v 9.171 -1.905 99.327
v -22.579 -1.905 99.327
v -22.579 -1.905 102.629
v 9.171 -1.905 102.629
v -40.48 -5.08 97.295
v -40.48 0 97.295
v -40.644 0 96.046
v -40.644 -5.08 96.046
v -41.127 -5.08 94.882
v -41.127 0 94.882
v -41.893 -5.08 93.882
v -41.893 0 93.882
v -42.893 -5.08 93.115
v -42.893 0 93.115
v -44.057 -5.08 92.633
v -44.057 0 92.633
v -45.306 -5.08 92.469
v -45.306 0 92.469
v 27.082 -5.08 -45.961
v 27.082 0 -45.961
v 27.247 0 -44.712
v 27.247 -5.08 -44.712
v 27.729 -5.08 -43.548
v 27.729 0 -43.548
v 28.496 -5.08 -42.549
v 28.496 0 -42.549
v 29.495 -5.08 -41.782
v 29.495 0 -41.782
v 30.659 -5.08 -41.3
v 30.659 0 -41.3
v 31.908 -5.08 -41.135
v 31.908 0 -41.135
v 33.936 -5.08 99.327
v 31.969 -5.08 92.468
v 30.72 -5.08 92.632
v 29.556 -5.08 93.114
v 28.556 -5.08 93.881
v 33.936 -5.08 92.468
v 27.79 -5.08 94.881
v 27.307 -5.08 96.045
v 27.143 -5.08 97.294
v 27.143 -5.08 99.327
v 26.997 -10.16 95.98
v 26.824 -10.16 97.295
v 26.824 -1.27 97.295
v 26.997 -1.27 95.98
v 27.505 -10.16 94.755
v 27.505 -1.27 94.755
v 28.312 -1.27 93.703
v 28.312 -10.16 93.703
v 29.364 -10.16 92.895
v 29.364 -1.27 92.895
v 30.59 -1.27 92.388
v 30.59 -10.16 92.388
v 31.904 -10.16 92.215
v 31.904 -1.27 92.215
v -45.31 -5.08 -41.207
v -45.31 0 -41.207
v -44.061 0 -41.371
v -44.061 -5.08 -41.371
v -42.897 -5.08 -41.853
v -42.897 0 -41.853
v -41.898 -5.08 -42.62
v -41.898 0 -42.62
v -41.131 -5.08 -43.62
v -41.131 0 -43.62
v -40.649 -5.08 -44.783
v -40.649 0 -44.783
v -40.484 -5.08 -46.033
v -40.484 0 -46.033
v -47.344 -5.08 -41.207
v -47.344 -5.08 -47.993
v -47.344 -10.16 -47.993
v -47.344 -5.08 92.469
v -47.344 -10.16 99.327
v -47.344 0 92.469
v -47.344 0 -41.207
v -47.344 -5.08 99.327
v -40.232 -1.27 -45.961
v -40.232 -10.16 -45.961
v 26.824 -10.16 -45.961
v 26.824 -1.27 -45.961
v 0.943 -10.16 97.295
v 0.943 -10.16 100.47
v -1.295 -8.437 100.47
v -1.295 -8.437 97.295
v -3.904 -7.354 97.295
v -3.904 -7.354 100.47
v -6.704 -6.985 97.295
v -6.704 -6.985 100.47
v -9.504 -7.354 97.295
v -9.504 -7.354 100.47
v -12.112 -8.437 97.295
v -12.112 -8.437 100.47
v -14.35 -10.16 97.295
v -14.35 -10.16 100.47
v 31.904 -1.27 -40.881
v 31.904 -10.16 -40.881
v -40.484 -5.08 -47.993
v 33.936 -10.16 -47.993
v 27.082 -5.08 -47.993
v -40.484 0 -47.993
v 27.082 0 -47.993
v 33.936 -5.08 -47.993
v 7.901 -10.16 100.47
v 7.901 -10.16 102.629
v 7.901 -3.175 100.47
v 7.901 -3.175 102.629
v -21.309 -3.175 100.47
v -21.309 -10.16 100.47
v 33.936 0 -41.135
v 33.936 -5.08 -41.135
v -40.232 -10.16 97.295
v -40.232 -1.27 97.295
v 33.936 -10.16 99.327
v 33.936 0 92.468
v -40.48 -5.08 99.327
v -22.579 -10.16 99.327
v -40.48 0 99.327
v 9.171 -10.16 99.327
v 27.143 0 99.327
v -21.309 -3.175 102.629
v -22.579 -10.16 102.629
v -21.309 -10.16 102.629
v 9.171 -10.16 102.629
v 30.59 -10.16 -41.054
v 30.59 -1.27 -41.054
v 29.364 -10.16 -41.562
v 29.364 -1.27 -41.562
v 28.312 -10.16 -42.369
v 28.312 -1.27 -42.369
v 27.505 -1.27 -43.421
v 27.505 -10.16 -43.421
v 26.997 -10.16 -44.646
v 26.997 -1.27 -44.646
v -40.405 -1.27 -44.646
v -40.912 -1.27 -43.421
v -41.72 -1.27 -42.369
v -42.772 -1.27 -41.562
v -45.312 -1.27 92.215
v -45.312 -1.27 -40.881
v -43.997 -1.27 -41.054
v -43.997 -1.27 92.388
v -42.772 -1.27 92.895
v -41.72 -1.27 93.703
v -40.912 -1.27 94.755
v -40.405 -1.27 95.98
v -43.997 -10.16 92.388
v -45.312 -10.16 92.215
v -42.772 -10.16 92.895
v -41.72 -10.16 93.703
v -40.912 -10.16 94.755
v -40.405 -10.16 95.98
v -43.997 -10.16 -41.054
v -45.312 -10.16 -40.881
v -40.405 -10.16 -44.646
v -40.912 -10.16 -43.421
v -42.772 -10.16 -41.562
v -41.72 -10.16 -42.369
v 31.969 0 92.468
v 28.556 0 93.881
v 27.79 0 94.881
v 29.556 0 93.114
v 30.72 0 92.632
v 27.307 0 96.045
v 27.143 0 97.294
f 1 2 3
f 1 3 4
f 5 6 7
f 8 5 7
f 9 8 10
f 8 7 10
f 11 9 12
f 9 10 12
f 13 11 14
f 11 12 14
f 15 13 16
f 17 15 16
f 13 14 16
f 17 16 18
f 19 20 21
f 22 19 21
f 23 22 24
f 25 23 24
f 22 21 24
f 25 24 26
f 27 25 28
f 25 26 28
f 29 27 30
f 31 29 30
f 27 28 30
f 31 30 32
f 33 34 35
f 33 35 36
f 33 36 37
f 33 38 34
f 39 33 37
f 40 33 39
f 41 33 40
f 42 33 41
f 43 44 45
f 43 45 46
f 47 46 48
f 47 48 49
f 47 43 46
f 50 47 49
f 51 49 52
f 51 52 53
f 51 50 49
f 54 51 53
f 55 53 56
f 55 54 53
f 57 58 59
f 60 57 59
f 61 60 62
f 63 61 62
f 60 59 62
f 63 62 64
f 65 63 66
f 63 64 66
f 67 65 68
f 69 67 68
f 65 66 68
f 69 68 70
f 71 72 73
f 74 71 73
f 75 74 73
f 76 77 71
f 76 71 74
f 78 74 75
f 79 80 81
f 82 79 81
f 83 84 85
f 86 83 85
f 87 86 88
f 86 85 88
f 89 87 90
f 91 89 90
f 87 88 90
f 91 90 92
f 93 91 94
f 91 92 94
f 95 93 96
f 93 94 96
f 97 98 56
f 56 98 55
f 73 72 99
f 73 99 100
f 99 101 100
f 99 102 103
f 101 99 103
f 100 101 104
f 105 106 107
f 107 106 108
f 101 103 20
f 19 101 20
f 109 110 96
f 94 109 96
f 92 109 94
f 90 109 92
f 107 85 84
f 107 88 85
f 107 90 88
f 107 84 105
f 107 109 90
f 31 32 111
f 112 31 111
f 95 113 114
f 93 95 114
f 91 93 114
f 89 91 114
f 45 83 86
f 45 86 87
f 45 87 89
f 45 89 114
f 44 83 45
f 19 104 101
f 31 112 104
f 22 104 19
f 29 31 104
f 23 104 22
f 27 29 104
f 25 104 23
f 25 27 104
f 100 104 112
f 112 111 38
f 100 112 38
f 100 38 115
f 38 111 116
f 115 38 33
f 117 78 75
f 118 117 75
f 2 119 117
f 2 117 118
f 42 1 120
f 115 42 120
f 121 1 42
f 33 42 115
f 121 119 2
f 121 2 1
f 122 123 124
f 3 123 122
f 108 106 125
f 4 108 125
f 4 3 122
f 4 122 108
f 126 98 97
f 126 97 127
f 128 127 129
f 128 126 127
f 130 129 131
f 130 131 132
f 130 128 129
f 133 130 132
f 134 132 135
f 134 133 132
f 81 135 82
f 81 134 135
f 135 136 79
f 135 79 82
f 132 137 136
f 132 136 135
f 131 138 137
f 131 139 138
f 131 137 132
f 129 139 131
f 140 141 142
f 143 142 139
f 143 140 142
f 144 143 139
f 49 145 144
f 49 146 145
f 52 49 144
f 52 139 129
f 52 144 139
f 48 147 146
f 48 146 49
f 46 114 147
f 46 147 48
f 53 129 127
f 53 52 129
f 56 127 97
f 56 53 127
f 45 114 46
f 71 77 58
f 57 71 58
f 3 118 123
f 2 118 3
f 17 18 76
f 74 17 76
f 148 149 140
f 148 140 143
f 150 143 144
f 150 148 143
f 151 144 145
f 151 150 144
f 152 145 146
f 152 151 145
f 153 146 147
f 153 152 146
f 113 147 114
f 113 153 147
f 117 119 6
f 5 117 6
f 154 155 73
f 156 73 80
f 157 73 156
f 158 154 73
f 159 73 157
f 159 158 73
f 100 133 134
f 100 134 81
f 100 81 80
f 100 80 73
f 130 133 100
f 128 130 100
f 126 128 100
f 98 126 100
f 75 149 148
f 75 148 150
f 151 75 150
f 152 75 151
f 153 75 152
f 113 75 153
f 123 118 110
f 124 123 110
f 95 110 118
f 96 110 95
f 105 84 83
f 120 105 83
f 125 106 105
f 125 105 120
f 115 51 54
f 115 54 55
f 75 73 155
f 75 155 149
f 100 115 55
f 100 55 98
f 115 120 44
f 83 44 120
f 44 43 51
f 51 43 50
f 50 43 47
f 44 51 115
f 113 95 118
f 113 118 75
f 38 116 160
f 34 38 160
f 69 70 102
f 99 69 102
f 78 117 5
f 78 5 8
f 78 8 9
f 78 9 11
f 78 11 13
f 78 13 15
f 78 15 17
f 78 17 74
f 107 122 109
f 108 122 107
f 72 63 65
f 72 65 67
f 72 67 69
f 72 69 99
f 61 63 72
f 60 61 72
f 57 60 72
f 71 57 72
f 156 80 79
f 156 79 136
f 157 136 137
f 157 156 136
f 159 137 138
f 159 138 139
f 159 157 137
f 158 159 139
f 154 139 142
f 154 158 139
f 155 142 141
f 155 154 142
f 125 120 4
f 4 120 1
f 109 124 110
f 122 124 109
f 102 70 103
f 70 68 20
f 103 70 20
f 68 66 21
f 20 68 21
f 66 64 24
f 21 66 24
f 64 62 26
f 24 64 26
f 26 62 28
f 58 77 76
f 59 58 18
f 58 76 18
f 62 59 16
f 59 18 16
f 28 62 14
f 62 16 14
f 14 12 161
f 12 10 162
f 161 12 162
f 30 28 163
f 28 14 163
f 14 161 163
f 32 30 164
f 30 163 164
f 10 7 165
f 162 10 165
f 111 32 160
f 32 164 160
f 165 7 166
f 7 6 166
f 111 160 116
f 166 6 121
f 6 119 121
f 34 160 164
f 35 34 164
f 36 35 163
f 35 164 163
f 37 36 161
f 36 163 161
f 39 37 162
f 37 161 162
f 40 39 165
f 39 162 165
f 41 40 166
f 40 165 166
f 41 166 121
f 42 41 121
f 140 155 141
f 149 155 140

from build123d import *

# Parameters (mm, degrees)
F0_W      = 81.28
F0_H      = 147.32
F1_DEPTH  = 10.16
F2_W      = 77.216
F2_H      = 143.256
F3_DEPTH  = 8.89
F5_DEPTH  = 10.16
F6_W      = 31.75
F6_H      = 8.255
F7_DEPTH  = 3.302
F8_W      = 29.21
F8_H      = 6.985
F9_DEPTH  = 2.159
F11_DEPTH = 25.4
F13_DEPTH = 5.08


with BuildPart() as f1:
    # F0 (on Front) → F1 (new body)
    with BuildSketch(Plane.XZ):
        with Locations((-6.703687, 25.66678)):
            Rectangle(F0_W, F0_H)
    extrude(amount=F1_DEPTH)

    # F2 (on face) → F3 (cut)
    with BuildSketch(Plane.XZ.offset(10.16)):
        with Locations((-6.703687, 25.66678)):
            Rectangle(F2_W, F2_H)
    extrude(amount=-F3_DEPTH, mode=Mode.SUBTRACT)

    # F4 (on face) → F5 (join)
    with BuildSketch(Plane.XZ.offset(10.16)):
        with BuildLine():
            ThreePointArc((-45.311687, 92.21478), (-41.719585, 93.702678), (-40.231687, 97.29478))
            Line((-40.231687, 97.29478), (-45.311687, 97.29478))
            Line((-45.311687, 97.29478), (-45.311687, 92.21478))
        make_face()
        with BuildLine():
            Line((31.904313, 97.29478), (26.824313, 97.29478))
            ThreePointArc((26.824313, 97.29478), (28.31221, 93.702678), (31.904313, 92.21478))
            Line((31.904313, 92.21478), (31.904313, 97.29478))
        make_face()
        with BuildLine():
            ThreePointArc((-40.231687, -45.96122), (-41.719585, -42.369117), (-45.311687, -40.88122))
            Line((-45.311687, -40.88122), (-45.311687, -45.96122))
            Line((-45.311687, -45.96122), (-40.231687, -45.96122))
        make_face()
        with BuildLine():
            ThreePointArc((31.904313, -40.88122), (28.31221, -42.369117), (26.824313, -45.96122))
            Line((26.824313, -45.96122), (31.904313, -45.96122))
            Line((31.904313, -45.96122), (31.904313, -40.88122))
        make_face()
    extrude(amount=-F5_DEPTH)

    # F6 (on face) → F7 (join)
    with BuildSketch(Plane.XY.offset(99.32678)):
        with Locations((-6.703687, -6.0325)):
            Rectangle(F6_W, F6_H)
    extrude(amount=F7_DEPTH)

    # F8 (on face) → F9 (cut)
    with BuildSketch(Plane.XY.offset(102.62878)):
        with Locations((-6.703687, -6.6675)):
            Rectangle(F8_W, F8_H)
    extrude(amount=-F9_DEPTH, mode=Mode.SUBTRACT)

    # F10 (on face) → F11 (cut)
    with BuildSketch(Plane.XY.offset(100.46978)):
        with BuildLine():
            Line((-14.3501, -10.16), (0.942725, -10.16))
            ThreePointArc((0.942725, -10.16), (-6.703687, -6.985), (-14.3501, -10.16))
        make_face()
    extrude(amount=-F11_DEPTH, mode=Mode.SUBTRACT)

    # F12 (on face) → F13 (cut)
    with BuildSketch(Plane(origin=(0, 0, 0), x_dir=(-1, 0, 0), z_dir=(0, 1, 0))):
        with BuildLine():
            ThreePointArc((-31.968985, 92.467752), (-28.556487, 93.881254), (-27.142985, 97.293752))
            Line((-27.142985, 97.293752), (-27.142985, 99.32678))
            Line((-27.142985, 99.32678), (-33.936313, 99.32678))
            Line((-33.936313, 99.32678), (-33.936313, 92.467752))
            Line((-33.936313, 92.467752), (-31.968985, 92.467752))
        make_face()
        with BuildLine():
            Line((40.479984, 99.32678), (40.479984, 97.294772))
            ThreePointArc((40.479984, 97.294772), (41.893487, 93.882275), (45.305984, 92.468772))
            Line((45.305984, 92.468772), (47.343687, 92.468772))
            Line((47.343687, 92.468772), (47.343687, 99.32678))
            Line((47.343687, 99.32678), (40.479984, 99.32678))
        make_face()
        with BuildLine():
            ThreePointArc((-27.082259, -45.961216), (-28.495762, -42.548718), (-31.908259, -41.135216))
            Line((-31.908259, -41.135216), (-33.936313, -41.135216))
            Line((-33.936313, -41.135216), (-33.936313, -47.99322))
            Line((-33.936313, -47.99322), (-27.082259, -47.99322))
            Line((-27.082259, -47.99322), (-27.082259, -45.961216))
        make_face()
        with BuildLine():
            Line((47.343687, -41.20655), (45.310436, -41.20655))
            ThreePointArc((45.310436, -41.20655), (41.897938, -42.620053), (40.484436, -46.03255))
            Line((40.484436, -46.03255), (40.484436, -47.99322))
            Line((40.484436, -47.99322), (47.343687, -47.99322))
            Line((47.343687, -47.99322), (47.343687, -41.20655))
        make_face()
    extrude(amount=-F13_DEPTH, mode=Mode.SUBTRACT)


solid = f1.part
